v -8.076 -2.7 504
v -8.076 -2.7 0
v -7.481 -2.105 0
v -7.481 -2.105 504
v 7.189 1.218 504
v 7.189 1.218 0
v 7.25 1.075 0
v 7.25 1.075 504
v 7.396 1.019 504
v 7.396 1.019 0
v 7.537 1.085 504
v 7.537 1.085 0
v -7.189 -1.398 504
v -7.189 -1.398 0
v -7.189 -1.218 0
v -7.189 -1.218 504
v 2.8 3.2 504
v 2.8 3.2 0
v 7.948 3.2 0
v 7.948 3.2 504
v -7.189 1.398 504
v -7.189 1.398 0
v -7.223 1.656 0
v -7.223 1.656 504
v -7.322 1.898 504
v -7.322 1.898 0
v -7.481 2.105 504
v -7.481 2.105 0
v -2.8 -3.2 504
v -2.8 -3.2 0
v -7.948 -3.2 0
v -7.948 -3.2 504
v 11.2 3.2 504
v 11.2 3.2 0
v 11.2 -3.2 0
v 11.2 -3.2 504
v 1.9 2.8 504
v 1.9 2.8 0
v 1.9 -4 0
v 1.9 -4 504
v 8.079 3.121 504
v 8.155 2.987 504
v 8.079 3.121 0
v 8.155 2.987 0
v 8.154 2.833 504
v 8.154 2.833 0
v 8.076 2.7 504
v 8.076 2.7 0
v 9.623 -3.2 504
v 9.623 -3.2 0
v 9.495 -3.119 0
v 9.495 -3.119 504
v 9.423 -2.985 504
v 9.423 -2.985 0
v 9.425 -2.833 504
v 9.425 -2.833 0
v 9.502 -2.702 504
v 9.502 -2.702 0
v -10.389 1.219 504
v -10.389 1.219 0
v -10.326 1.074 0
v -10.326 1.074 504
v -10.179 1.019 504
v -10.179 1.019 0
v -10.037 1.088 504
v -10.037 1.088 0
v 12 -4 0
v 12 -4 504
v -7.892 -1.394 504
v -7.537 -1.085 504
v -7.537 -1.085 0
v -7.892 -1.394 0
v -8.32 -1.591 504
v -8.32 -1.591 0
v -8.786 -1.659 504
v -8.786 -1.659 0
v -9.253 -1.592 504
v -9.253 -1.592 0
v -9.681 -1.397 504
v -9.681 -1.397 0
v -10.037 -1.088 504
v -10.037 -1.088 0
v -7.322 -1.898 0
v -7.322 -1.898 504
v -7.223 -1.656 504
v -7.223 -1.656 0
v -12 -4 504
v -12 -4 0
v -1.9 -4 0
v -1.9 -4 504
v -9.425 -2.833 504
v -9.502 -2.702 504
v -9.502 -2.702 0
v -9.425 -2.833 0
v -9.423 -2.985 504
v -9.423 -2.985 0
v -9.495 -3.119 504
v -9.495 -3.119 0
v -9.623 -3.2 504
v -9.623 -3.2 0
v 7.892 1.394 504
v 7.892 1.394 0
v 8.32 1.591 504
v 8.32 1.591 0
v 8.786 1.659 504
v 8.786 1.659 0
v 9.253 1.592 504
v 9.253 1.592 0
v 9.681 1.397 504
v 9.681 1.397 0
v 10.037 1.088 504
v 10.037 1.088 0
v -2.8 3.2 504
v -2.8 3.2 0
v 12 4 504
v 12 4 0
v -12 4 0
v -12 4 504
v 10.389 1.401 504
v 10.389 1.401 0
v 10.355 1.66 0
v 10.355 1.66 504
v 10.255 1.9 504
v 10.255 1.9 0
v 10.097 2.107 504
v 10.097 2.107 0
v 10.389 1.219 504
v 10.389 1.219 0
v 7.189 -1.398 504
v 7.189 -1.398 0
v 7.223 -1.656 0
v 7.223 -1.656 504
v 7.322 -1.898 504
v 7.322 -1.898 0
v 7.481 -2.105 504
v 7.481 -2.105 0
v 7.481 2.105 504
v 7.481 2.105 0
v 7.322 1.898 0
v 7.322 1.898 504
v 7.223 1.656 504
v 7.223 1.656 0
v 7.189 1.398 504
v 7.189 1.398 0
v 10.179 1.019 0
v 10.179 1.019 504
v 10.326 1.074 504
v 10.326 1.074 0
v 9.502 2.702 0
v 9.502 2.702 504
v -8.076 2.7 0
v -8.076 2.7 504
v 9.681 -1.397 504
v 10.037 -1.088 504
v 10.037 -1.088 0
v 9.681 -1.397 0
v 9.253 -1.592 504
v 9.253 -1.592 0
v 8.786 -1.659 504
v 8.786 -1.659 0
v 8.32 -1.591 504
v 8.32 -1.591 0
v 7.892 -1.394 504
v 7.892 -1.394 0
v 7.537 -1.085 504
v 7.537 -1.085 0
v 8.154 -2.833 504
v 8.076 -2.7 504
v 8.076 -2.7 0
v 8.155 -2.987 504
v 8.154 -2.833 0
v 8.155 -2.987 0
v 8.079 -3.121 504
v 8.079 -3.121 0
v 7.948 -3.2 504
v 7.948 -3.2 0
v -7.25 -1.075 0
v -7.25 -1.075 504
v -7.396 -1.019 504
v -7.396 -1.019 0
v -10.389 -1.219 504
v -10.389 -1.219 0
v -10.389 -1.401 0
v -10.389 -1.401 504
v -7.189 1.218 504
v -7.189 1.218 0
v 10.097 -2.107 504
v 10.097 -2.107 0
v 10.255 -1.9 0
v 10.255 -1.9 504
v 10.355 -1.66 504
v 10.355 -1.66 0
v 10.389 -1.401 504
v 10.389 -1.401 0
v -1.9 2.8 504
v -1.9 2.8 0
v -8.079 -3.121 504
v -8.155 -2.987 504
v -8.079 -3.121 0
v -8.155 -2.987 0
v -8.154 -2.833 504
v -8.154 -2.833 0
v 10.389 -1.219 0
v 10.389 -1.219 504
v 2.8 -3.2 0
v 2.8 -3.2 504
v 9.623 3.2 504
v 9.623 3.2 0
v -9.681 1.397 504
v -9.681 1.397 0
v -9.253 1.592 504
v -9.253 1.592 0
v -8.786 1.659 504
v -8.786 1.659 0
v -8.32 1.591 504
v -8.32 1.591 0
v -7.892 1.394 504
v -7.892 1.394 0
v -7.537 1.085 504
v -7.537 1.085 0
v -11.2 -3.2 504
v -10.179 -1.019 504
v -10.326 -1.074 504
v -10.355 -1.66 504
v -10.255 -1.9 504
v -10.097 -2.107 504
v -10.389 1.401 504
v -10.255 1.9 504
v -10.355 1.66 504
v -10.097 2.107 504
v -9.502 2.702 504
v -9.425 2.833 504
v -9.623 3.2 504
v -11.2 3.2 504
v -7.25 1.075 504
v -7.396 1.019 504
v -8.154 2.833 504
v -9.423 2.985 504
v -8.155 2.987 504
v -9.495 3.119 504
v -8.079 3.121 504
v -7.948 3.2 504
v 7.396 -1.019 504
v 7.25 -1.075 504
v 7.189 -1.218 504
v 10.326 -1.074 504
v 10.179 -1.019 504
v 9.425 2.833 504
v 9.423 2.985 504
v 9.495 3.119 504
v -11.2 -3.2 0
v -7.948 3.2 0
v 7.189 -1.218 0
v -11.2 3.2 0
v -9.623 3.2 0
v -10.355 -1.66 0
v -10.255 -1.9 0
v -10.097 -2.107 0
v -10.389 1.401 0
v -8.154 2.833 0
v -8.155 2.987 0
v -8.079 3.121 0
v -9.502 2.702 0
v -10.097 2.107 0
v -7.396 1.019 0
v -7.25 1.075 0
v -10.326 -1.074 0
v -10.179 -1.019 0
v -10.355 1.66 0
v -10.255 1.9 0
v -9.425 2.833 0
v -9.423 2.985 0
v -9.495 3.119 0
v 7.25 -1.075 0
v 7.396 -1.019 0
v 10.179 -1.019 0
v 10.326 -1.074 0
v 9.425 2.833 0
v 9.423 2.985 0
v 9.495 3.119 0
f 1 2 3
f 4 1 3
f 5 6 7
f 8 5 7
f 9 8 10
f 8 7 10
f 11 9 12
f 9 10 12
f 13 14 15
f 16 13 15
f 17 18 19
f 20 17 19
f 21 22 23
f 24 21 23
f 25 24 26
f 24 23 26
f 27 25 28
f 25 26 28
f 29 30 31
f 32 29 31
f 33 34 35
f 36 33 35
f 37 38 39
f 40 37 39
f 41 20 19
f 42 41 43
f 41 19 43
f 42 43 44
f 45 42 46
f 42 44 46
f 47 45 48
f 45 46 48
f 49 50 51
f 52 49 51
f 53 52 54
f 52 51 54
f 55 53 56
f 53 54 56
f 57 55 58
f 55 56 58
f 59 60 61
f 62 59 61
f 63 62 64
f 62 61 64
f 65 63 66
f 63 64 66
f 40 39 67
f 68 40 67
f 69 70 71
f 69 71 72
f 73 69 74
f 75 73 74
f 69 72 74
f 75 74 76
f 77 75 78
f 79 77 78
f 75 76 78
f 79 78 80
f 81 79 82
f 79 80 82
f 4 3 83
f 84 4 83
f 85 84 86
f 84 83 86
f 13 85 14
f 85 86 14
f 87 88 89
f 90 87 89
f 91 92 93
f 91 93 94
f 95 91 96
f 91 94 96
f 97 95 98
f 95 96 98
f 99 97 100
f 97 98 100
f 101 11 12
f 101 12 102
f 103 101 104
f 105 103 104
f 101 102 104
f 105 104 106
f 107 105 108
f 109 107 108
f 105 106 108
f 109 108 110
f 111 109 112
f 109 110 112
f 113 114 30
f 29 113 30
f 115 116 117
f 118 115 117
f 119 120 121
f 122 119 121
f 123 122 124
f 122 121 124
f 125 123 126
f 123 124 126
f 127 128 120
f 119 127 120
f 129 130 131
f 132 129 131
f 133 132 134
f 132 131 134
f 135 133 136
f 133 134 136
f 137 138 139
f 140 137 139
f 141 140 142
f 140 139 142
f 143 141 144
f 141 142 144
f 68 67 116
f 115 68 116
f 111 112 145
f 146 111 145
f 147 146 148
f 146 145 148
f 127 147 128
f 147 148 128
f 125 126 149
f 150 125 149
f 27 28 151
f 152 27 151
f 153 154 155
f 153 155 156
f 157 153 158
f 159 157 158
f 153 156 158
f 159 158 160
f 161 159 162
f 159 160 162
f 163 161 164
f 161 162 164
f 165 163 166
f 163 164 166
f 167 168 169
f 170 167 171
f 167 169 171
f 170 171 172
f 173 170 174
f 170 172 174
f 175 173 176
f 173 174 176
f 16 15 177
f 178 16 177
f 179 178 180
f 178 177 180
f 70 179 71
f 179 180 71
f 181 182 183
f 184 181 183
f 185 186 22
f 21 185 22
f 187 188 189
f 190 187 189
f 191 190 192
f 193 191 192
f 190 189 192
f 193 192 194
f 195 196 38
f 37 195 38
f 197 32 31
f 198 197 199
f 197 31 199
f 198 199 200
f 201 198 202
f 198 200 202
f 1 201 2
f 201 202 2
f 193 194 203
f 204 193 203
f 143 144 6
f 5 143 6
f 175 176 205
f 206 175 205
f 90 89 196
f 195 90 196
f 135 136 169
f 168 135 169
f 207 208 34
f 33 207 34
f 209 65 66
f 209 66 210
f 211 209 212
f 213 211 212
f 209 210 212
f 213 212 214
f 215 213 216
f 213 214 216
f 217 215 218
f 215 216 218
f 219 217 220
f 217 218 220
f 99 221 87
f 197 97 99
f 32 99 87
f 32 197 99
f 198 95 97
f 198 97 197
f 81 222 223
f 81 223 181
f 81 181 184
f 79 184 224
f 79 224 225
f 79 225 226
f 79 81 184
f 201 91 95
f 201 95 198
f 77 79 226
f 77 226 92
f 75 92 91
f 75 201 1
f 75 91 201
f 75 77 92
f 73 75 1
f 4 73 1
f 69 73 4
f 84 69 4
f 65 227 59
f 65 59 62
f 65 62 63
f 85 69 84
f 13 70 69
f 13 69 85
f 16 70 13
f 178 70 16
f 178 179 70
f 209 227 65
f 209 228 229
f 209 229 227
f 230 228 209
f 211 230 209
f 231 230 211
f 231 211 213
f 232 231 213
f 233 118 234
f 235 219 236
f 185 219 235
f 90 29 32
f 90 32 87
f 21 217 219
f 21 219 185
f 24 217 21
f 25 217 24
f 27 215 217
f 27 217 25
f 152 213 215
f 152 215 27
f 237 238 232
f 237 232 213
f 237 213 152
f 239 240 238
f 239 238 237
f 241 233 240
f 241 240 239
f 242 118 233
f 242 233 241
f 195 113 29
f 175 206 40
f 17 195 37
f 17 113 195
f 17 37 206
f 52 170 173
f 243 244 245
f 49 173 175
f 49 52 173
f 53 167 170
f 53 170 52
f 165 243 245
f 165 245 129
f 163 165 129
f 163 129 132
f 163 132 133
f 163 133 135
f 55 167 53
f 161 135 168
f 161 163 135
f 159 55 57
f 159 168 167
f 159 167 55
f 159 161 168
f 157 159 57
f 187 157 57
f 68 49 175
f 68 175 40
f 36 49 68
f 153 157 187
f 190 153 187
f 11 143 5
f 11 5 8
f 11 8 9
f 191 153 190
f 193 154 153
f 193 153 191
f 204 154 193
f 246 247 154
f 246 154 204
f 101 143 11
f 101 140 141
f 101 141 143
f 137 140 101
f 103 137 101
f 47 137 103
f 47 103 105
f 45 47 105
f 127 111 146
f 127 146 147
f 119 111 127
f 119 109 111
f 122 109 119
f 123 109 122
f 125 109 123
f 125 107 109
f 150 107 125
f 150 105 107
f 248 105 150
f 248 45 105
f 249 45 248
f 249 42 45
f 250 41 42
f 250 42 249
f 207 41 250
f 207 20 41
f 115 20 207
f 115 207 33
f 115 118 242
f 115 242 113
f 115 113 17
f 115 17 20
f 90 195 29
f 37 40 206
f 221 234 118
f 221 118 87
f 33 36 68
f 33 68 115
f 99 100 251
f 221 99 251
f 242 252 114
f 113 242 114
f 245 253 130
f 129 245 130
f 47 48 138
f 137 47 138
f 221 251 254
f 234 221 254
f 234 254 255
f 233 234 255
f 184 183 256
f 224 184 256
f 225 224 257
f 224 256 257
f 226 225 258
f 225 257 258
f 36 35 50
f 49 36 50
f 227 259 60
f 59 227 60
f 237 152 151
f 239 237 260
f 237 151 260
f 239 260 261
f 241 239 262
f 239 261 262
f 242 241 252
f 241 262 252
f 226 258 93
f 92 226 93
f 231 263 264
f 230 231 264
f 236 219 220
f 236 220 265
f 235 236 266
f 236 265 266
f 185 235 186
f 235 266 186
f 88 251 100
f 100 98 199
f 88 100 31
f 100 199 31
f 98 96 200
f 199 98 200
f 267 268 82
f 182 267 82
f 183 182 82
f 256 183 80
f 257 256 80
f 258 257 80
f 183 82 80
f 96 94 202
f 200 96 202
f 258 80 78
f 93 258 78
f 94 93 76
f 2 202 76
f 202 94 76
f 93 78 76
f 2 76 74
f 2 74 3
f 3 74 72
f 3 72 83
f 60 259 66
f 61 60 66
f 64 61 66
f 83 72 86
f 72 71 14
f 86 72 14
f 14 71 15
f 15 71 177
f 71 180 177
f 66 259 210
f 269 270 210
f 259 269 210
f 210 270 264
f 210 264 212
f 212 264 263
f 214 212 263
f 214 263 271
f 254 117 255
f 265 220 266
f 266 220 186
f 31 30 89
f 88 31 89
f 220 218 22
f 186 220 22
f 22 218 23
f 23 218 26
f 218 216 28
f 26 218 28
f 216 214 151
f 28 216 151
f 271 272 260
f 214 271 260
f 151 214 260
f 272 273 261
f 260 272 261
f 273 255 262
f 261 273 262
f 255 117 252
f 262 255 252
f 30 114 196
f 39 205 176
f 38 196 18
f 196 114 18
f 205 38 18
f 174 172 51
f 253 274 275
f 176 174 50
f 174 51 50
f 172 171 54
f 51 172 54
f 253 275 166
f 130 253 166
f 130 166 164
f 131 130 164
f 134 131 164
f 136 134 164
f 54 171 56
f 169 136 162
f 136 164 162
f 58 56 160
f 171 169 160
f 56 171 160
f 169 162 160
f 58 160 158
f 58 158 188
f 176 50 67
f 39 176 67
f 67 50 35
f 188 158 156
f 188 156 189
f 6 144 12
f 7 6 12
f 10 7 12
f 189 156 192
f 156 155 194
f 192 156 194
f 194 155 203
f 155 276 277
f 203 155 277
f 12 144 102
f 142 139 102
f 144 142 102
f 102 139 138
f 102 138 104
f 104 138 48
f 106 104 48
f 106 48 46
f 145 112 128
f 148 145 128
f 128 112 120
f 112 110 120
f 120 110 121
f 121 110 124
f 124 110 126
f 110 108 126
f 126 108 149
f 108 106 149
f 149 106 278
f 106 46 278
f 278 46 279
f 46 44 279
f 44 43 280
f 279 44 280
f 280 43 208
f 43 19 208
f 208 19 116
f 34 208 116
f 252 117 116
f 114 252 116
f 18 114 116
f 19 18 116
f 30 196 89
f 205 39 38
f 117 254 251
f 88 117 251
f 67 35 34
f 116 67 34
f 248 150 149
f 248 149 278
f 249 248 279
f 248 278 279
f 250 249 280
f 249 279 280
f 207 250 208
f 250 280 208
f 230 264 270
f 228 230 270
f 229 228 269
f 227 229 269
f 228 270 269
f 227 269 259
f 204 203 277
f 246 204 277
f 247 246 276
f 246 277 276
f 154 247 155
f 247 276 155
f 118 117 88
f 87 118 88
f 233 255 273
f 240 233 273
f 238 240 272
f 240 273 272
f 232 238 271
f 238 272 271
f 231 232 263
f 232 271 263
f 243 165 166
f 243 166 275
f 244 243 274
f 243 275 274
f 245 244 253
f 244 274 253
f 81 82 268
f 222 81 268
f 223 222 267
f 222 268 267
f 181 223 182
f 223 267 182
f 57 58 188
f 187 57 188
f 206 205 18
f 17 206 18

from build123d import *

# Parameters (mm, degrees)
F1_DEPTH = 504


with BuildPart() as f1:
    # F0 (on Top) → F1 (new body)
    with BuildSketch(Plane.XY):
        Polygon((12, 4), (-12, 4), (-12, -4), (-1.9, -4), (-1.9, 2.8), (1.9, 2.8), (1.9, -4), (12, -4), align=None)
        with BuildLine():
            Line((-9.623275, -3.2), (-11.2, -3.2))
            Line((-11.2, -3.2), (-11.2, 3.2))
            Line((-11.2, 3.2), (-9.623275, 3.2))
            ThreePointArc((-9.623275, 3.2), (-9.422747, 2.985045), (-9.502111, 2.701993))
            Line((-9.502111, 2.701993), (-10.097086, 2.107018))
            ThreePointArc((-10.097086, 2.107018), (-10.312788, 1.783105), (-10.388512, 1.401382))
            Line((-10.388512, 1.401382), (-10.388512, 1.218503))
            ThreePointArc((-10.388512, 1.218503), (-10.25826, 1.031059), (-10.03716, 1.087764))
            ThreePointArc((-10.03716, 1.087764), (-8.786443, 1.659163), (-7.537162, 1.084629))
            ThreePointArc((-7.537162, 1.084629), (-7.316853, 1.031709), (-7.188512, 1.218431))
            Line((-7.188512, 1.218431), (-7.188512, 1.397588))
            ThreePointArc((-7.188512, 1.397588), (-7.264631, 1.780269), (-7.481401, 2.104691))
            Line((-7.481401, 2.104691), (-8.076376, 2.699666))
            ThreePointArc((-8.076376, 2.699666), (-8.154767, 2.986603), (-7.947546, 3.2))
            Line((-7.947546, 3.2), (-2.8, 3.2))
            Line((-2.8, 3.2), (-2.8, -3.2))
            Line((-2.8, -3.2), (-7.947546, -3.2))
            ThreePointArc((-7.947546, -3.2), (-8.154767, -2.986603), (-8.076376, -2.699666))
            Line((-8.076376, -2.699666), (-7.481401, -2.104691))
            ThreePointArc((-7.481401, -2.104691), (-7.264631, -1.780269), (-7.188512, -1.397588))
            Line((-7.188512, -1.397588), (-7.188512, -1.218431))
            ThreePointArc((-7.188512, -1.218431), (-7.316853, -1.031709), (-7.537162, -1.084629))
            ThreePointArc((-7.537162, -1.084629), (-8.786443, -1.659163), (-10.03716, -1.087764))
            ThreePointArc((-10.03716, -1.087764), (-10.25826, -1.031059), (-10.388512, -1.218503))
            Line((-10.388512, -1.218503), (-10.388512, -1.401382))
            ThreePointArc((-10.388512, -1.401382), (-10.312788, -1.783105), (-10.097086, -2.107018))
            Line((-10.097086, -2.107018), (-9.502111, -2.701993))
            ThreePointArc((-9.502111, -2.701993), (-9.422747, -2.985045), (-9.623275, -3.2))
        make_face(mode=Mode.SUBTRACT)
        with BuildLine():
            Line((7.188512, 1.397588), (7.188512, 1.218431))
            ThreePointArc((7.188512, 1.218431), (7.316853, 1.031709), (7.537162, 1.084629))
            ThreePointArc((7.537162, 1.084629), (8.786443, 1.659163), (10.03716, 1.087764))
            ThreePointArc((10.03716, 1.087764), (10.25826, 1.031059), (10.388512, 1.218503))
            Line((10.388512, 1.218503), (10.388512, 1.401382))
            ThreePointArc((10.388512, 1.401382), (10.312788, 1.783105), (10.097086, 2.107018))
            Line((10.097086, 2.107018), (9.502111, 2.701993))
            ThreePointArc((9.502111, 2.701993), (9.422747, 2.985045), (9.623275, 3.2))
            Line((9.623275, 3.2), (11.2, 3.2))
            Line((11.2, 3.2), (11.2, -3.2))
            Line((11.2, -3.2), (9.623275, -3.2))
            ThreePointArc((9.623275, -3.2), (9.422747, -2.985045), (9.502111, -2.701993))
            Line((9.502111, -2.701993), (10.097086, -2.107018))
            ThreePointArc((10.097086, -2.107018), (10.312788, -1.783105), (10.388512, -1.401382))
            Line((10.388512, -1.401382), (10.388512, -1.218503))
            ThreePointArc((10.388512, -1.218503), (10.25826, -1.031059), (10.03716, -1.087764))
            ThreePointArc((10.03716, -1.087764), (8.786443, -1.659163), (7.537162, -1.084629))
            ThreePointArc((7.537162, -1.084629), (7.316853, -1.031709), (7.188512, -1.218431))
            Line((7.188512, -1.218431), (7.188512, -1.397588))
            ThreePointArc((7.188512, -1.397588), (7.264631, -1.780269), (7.481401, -2.104691))
            Line((7.481401, -2.104691), (8.076376, -2.699666))
            ThreePointArc((8.076376, -2.699666), (8.154767, -2.986603), (7.947546, -3.2))
            Line((7.947546, -3.2), (2.8, -3.2))
            Line((2.8, -3.2), (2.8, 3.2))
            Line((2.8, 3.2), (7.947546, 3.2))
            ThreePointArc((7.947546, 3.2), (8.154767, 2.986603), (8.076376, 2.699666))
            Line((8.076376, 2.699666), (7.481401, 2.104691))
            ThreePointArc((7.481401, 2.104691), (7.264631, 1.780269), (7.188512, 1.397588))
        make_face(mode=Mode.SUBTRACT)
    extrude(amount=F1_DEPTH)


solid = f1.part
